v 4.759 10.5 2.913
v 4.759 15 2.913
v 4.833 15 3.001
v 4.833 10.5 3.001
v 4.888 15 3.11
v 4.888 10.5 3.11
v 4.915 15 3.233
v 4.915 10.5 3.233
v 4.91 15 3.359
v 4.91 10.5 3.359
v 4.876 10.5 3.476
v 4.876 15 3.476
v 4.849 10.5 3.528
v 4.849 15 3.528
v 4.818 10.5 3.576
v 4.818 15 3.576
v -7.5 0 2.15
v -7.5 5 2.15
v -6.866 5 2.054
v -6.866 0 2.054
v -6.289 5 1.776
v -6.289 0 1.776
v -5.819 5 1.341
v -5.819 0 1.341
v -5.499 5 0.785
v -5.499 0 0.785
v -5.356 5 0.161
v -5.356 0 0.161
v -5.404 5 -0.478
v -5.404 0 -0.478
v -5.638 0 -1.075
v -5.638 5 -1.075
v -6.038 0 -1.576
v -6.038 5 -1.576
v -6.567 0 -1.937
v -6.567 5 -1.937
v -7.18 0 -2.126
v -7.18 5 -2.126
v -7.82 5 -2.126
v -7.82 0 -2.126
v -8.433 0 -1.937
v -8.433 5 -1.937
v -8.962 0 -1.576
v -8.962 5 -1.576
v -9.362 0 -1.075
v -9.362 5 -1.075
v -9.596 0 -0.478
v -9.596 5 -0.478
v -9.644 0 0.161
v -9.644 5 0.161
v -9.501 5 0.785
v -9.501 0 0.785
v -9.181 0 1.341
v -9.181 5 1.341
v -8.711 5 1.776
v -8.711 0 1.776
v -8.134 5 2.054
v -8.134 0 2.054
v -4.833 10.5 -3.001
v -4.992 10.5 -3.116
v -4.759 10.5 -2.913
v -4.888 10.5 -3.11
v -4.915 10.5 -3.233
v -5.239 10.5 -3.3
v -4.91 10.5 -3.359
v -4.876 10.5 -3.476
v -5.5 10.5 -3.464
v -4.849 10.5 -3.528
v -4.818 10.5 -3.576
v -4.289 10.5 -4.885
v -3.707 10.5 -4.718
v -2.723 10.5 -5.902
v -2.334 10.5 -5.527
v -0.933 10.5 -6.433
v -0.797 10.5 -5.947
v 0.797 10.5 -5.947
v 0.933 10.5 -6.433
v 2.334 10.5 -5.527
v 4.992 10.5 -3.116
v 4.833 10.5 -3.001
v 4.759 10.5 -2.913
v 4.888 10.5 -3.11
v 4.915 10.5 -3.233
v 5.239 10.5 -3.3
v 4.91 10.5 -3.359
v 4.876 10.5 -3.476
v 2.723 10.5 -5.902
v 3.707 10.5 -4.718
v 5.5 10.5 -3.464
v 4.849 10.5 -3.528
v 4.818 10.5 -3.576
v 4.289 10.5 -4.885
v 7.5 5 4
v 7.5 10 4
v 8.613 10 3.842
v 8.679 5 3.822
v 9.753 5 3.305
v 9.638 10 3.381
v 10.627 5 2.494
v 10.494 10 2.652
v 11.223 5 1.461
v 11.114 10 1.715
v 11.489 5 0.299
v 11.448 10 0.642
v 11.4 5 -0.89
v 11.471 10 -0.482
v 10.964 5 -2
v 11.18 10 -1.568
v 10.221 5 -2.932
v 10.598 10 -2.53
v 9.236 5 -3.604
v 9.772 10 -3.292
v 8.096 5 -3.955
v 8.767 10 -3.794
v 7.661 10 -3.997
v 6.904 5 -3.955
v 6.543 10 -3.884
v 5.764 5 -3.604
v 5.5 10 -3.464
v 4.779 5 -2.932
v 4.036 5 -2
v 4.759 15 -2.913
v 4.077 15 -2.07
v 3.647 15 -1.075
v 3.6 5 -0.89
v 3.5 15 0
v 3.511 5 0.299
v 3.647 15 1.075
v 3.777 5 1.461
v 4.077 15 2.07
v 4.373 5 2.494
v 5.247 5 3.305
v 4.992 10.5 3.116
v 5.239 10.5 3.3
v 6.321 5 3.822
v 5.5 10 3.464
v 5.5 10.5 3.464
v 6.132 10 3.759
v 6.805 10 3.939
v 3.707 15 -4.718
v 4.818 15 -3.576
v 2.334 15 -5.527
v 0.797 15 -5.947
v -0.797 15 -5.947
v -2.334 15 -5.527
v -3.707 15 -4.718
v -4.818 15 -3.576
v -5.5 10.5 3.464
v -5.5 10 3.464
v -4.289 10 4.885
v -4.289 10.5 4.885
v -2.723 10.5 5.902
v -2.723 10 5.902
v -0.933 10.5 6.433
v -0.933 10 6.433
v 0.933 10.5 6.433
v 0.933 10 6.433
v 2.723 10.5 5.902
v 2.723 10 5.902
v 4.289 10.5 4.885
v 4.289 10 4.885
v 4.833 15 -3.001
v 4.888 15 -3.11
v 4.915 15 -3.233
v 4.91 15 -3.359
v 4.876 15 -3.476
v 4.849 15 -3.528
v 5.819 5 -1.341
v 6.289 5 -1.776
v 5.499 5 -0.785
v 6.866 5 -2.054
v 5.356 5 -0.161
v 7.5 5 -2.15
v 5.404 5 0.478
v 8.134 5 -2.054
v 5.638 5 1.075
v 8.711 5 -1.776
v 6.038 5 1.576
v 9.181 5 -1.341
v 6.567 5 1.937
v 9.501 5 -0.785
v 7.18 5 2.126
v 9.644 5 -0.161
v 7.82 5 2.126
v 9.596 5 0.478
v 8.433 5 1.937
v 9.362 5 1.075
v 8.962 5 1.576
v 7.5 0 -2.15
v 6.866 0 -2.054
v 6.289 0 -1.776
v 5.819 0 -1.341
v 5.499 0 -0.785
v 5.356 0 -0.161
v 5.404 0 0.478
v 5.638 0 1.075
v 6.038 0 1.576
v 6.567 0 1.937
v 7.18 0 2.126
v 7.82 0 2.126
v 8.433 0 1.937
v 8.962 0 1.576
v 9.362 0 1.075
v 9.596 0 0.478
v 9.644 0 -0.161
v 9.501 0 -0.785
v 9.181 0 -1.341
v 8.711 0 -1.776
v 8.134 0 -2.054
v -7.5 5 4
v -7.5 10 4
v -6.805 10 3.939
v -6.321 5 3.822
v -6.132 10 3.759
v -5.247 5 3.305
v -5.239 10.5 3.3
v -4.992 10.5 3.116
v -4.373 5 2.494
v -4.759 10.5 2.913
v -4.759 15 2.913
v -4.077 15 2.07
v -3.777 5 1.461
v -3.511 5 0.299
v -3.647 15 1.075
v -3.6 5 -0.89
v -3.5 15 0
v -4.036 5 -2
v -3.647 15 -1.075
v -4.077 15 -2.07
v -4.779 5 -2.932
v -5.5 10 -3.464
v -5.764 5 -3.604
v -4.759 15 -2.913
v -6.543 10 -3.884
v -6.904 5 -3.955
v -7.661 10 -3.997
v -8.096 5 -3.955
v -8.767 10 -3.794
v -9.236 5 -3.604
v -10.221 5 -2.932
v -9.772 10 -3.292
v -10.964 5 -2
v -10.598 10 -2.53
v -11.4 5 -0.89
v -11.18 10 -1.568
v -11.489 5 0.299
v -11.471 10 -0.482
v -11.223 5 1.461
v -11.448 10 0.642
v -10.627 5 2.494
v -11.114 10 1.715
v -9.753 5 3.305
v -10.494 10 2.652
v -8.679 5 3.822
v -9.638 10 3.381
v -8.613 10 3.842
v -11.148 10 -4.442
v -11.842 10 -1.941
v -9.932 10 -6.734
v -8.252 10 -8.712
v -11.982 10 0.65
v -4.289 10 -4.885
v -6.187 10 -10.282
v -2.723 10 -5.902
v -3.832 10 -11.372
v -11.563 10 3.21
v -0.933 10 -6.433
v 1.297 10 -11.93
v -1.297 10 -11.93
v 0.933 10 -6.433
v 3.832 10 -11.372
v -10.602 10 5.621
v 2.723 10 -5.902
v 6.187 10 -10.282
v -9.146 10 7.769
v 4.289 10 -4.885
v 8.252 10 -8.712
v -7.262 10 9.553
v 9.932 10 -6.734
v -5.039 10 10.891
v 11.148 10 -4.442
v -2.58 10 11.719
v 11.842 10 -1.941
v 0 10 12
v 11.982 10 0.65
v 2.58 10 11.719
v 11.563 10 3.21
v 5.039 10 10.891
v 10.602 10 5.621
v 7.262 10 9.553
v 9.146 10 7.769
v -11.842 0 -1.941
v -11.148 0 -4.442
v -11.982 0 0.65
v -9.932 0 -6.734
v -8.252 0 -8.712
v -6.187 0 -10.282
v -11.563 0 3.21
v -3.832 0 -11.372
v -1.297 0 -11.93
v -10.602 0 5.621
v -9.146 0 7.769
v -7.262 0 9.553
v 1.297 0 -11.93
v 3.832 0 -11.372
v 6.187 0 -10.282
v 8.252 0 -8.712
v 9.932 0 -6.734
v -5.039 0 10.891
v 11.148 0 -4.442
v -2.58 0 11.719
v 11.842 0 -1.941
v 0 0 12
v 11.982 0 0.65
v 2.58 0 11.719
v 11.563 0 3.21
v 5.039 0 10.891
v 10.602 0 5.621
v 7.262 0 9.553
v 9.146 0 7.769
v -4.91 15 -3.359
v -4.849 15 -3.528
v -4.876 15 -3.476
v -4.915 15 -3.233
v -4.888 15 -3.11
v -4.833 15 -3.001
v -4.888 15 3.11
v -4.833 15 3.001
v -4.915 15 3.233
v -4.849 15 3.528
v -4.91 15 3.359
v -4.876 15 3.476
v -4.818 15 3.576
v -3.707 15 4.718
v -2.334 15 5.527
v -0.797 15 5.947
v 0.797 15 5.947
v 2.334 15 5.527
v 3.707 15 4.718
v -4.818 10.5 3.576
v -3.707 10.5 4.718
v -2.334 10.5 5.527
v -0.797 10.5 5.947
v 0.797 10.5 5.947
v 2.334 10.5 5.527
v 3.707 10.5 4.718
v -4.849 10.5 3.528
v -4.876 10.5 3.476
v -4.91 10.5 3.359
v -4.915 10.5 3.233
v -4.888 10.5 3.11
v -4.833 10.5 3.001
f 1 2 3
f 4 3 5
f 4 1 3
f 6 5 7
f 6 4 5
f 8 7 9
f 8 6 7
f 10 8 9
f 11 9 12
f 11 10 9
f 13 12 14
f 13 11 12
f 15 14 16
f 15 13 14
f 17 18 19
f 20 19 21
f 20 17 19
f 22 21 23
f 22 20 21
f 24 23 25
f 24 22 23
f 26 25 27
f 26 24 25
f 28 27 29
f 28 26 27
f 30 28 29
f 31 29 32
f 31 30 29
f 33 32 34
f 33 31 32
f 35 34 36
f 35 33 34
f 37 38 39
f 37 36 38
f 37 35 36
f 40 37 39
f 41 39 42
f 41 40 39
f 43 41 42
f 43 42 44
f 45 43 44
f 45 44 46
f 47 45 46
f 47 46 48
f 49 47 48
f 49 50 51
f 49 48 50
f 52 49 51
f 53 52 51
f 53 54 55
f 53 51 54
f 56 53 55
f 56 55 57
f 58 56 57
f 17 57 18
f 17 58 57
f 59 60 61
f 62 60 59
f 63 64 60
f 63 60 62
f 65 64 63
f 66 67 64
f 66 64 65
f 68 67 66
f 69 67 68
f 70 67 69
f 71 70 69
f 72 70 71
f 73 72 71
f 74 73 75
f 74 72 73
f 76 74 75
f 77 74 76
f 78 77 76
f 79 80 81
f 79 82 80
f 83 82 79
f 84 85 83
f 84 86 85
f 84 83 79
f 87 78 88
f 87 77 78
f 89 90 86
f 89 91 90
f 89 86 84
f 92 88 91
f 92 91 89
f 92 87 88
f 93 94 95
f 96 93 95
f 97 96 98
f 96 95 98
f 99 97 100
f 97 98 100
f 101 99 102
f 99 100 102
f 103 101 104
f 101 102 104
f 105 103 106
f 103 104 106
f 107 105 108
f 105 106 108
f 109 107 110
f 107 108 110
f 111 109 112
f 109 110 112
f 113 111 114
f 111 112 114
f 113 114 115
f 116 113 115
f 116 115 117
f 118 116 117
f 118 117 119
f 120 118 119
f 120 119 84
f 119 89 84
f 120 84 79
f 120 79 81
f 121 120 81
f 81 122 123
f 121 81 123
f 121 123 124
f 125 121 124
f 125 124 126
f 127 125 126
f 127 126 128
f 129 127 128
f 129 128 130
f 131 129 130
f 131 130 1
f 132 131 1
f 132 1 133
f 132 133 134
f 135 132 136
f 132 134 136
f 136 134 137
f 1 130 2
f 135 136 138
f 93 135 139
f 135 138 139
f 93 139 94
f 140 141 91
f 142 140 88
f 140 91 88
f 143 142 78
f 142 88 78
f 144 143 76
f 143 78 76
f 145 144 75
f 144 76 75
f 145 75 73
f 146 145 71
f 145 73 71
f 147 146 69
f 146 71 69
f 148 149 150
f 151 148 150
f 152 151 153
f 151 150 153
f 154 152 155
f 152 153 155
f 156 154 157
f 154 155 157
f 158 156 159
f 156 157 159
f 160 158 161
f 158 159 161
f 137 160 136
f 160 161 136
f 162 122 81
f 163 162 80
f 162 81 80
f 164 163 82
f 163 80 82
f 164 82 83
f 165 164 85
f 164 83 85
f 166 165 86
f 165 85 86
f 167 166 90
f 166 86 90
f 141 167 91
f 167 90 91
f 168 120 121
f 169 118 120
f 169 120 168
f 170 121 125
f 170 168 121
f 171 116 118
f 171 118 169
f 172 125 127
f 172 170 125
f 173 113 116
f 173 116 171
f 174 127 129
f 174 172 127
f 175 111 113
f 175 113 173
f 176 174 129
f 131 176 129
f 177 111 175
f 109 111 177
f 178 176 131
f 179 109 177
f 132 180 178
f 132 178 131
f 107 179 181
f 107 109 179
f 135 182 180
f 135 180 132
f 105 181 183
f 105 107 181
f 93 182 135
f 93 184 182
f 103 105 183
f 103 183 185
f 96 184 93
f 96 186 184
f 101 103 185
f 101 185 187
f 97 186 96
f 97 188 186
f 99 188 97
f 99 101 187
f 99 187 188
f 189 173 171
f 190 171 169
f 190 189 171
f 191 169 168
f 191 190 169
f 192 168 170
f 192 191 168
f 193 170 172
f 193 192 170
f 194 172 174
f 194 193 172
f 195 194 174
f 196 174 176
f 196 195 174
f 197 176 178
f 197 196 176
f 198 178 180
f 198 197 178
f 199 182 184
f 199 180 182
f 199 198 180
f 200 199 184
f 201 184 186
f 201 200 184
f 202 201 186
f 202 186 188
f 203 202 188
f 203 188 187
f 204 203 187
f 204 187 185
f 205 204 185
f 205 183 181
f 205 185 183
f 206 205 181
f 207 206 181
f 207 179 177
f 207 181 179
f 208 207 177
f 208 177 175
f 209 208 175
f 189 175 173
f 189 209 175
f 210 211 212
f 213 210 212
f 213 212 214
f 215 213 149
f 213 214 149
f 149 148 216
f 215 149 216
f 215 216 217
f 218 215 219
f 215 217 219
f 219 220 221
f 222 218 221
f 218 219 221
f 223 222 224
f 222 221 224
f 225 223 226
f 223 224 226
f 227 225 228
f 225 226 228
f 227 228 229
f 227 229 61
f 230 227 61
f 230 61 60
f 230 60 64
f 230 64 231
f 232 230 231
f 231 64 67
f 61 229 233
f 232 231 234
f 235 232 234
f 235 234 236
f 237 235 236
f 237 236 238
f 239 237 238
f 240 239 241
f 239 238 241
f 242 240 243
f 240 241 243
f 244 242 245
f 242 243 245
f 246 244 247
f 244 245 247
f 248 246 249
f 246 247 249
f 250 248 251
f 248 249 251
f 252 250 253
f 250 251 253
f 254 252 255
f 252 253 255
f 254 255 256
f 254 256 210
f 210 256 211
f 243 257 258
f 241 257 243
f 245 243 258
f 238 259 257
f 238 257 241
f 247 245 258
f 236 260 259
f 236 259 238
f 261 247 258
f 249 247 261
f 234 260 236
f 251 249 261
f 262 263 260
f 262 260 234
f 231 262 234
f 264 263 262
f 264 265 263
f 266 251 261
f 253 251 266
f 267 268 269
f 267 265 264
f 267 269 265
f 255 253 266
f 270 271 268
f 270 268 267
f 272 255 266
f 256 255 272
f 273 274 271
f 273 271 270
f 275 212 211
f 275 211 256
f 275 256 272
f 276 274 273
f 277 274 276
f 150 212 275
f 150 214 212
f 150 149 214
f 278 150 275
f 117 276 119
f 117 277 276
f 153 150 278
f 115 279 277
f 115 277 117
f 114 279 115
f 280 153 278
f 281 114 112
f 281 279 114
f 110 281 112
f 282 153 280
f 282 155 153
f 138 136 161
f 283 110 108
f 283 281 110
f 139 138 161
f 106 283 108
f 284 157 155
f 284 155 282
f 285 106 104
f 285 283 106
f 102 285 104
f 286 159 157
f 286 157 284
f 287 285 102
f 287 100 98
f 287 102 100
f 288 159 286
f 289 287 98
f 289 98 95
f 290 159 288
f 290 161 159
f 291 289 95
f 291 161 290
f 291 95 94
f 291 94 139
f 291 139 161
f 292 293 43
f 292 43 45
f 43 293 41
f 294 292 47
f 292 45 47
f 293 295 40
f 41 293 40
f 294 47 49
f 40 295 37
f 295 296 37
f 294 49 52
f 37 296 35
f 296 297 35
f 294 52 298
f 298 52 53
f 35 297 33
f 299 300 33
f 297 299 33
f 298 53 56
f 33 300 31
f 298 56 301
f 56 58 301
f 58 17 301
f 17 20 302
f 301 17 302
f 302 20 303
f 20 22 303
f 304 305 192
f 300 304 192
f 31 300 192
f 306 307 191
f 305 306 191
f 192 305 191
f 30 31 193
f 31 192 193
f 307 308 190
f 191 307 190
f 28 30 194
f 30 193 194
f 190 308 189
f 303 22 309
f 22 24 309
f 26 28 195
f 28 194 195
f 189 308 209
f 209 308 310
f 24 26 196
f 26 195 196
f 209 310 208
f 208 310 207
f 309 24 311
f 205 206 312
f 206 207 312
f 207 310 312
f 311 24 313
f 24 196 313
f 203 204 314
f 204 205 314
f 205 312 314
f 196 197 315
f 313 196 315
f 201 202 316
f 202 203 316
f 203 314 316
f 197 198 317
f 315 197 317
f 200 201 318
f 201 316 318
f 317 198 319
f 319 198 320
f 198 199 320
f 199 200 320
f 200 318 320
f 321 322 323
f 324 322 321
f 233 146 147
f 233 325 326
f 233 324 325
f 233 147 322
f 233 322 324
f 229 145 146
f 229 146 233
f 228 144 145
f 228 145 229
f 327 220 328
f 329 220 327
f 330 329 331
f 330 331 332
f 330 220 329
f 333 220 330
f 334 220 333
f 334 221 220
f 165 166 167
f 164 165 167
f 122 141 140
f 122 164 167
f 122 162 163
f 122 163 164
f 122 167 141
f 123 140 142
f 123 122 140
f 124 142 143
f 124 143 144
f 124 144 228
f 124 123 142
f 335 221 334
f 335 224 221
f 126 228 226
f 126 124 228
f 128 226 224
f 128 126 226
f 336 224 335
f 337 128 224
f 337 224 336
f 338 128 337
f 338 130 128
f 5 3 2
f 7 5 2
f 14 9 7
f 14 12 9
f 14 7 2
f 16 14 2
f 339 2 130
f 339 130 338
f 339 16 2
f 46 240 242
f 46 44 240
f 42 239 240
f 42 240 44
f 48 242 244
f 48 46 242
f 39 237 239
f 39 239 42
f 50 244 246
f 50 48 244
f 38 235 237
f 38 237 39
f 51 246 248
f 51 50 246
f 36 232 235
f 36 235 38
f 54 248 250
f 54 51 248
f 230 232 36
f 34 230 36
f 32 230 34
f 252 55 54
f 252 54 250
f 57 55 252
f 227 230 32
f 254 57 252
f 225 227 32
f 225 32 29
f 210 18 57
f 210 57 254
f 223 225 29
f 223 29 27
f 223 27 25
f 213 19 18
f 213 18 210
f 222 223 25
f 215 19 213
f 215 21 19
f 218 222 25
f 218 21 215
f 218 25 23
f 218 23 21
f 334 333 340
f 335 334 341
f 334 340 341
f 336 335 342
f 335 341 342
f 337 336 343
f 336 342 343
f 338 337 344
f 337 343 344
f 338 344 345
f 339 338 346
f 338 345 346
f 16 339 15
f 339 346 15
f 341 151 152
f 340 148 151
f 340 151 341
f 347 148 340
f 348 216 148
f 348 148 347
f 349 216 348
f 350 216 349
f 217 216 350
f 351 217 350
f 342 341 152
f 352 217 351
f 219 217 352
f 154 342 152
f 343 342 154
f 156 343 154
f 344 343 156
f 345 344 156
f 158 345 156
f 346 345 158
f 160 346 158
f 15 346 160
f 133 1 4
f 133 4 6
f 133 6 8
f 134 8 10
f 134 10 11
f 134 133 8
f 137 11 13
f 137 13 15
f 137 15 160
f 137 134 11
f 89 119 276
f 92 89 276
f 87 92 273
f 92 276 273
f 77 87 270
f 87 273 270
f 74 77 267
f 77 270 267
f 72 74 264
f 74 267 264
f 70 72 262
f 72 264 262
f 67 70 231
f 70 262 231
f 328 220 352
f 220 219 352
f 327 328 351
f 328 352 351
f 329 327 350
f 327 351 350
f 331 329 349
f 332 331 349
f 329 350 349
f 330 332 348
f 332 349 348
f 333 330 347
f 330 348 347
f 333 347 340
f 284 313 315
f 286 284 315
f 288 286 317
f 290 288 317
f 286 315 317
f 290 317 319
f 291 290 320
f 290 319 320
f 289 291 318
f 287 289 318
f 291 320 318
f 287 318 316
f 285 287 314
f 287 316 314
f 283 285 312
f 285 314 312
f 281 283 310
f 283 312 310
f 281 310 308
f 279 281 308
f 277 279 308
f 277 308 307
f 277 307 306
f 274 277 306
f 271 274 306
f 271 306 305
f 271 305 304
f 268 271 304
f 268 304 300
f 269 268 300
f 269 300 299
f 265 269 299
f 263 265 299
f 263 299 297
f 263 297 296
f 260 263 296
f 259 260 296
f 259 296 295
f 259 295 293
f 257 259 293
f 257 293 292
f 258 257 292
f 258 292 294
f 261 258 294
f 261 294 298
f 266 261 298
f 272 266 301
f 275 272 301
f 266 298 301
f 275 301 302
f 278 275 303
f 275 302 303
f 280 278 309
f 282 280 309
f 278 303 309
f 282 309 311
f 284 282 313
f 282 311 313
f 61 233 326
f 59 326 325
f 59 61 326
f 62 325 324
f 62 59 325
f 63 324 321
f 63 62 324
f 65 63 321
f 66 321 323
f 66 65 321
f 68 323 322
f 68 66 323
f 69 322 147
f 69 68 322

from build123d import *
from build123d.topology import SkipClean

# Parameters (mm, degrees)
SKETCH_1_R          = 12
SKETCH_1_R_2        = 2.15
EXTRUDE_1_DEPTH     = 15
CUT_EXTRUDE_START   = -5
SKETCH_2_R          = 12
CUT_EXTRUDE_1_DEPTH = 5
EXTRUDE_2_DEPTH     = 0.5
SKETCH_4_R          = 4
CUT_EXTRUDE_2_DEPTH = 10
FILLET_1_R          = 0.5


with BuildPart() as part:
    # ｽｹｯﾁ1 → ﾎﾞｽ - 押し出し1 (new body)
    with BuildSketch(Plane(origin=(0, 0, 0), x_dir=(1, 0, 0), z_dir=(0, 1, 0))):
        with Locations(Location((0, 0, 0), (0, 0, 270))):
            Circle(SKETCH_1_R)
        with Locations(Location((-7.5, 0, 0), (0, 0, 270))):
            Circle(SKETCH_1_R_2, mode=Mode.SUBTRACT)
        with Locations(Location((7.5, 0, 0), (0, 0, 90))):
            Circle(SKETCH_1_R_2, mode=Mode.SUBTRACT)
    extrude(amount=EXTRUDE_1_DEPTH)

    # ｽｹｯﾁ2 → ｶｯﾄ - 押し出し1 (cut)
    with BuildSketch(Plane(origin=(0, 15, 0), x_dir=(1, 0, 0), z_dir=(0, 1, 0)).offset(CUT_EXTRUDE_START)):
        with Locations(Location((0, 0, 0), (0, 0, 270))):
            Circle(SKETCH_2_R)
        with BuildLine():
            ThreePointArc((5.841833333, 1.368569803), (0, 6), (-5.841833333, 1.368569803))
            ThreePointArc((-5.841833333, 1.368569803), (-5.35, 0), (-5.841833333, -1.368569803))
            ThreePointArc((-5.841833333, -1.368569803), (0, -6), (5.841833333, -1.368569803))
            ThreePointArc((5.841833333, -1.368569803), (5.35, 0), (5.841833333, 1.368569803))
        make_face(mode=Mode.SUBTRACT)
    extrude(amount=CUT_EXTRUDE_1_DEPTH, mode=Mode.SUBTRACT)

    # ｽｹｯﾁ3 → ﾎﾞｽ - 押し出し2 (add)
    with SkipClean():  # the faces are left unmerged after this step: merging them gives an invalid solid
        with BuildSketch(Plane(origin=(0, 10, 0), x_dir=(1, 0, 0), z_dir=(0, 1, 0))):
            with BuildLine():
                ThreePointArc((-6.2585, -1.755328388), (0, -6.5), (6.2585, -1.755328388))
                ThreePointArc((6.2585, -1.755328388), (6.03732702, -1.575781633), (5.841833333, -1.368569803))
                ThreePointArc((5.841833333, -1.368569803), (5.35, 0), (5.841833333, 1.368569803))
                ThreePointArc((5.841833333, 1.368569803), (6.03732702, 1.575781633), (6.2585, 1.755328388))
                ThreePointArc((6.2585, 1.755328388), (0, 6.5), (-6.2585, 1.755328388))
                ThreePointArc((-6.2585, 1.755328388), (-6.03732702, 1.575781633), (-5.841833333, 1.368569803))
                ThreePointArc((-5.841833333, 1.368569803), (-5.35, 0), (-5.841833333, -1.368569803))
                ThreePointArc((-5.841833333, -1.368569803), (-6.03732702, -1.575781633), (-6.2585, -1.755328388))
            make_face()
        extrude(amount=EXTRUDE_2_DEPTH)

    # ｽｹｯﾁ4 → ｶｯﾄ - 押し出し2 (cut)
    with BuildSketch(Plane(origin=(0, 15, 0), x_dir=(1, 0, 0), z_dir=(0, 1, 0))):
        with Locations(Location((-7.5, 0, 0), (0, 0, 270))):
            Circle(SKETCH_4_R)
        with Locations(Location((7.5, 0, 0), (0, 0, 270))):
            Circle(SKETCH_4_R)
    extrude(amount=-CUT_EXTRUDE_2_DEPTH, mode=Mode.SUBTRACT)

    # ﾌｨﾚｯﾄ1
    fillet_1_edges = [part.edges().sort_by_distance(p)[0] for p in [
        (-5.083333333, 12.75, 3.187431916),
        (-5.083333333, 12.75, -3.187431916),
        (5.083333333, 12.75, 3.187431916),
        (5.083333333, 12.75, -3.187431916),
    ]]
    fillet(fillet_1_edges, radius=FILLET_1_R)


solid = part.part
